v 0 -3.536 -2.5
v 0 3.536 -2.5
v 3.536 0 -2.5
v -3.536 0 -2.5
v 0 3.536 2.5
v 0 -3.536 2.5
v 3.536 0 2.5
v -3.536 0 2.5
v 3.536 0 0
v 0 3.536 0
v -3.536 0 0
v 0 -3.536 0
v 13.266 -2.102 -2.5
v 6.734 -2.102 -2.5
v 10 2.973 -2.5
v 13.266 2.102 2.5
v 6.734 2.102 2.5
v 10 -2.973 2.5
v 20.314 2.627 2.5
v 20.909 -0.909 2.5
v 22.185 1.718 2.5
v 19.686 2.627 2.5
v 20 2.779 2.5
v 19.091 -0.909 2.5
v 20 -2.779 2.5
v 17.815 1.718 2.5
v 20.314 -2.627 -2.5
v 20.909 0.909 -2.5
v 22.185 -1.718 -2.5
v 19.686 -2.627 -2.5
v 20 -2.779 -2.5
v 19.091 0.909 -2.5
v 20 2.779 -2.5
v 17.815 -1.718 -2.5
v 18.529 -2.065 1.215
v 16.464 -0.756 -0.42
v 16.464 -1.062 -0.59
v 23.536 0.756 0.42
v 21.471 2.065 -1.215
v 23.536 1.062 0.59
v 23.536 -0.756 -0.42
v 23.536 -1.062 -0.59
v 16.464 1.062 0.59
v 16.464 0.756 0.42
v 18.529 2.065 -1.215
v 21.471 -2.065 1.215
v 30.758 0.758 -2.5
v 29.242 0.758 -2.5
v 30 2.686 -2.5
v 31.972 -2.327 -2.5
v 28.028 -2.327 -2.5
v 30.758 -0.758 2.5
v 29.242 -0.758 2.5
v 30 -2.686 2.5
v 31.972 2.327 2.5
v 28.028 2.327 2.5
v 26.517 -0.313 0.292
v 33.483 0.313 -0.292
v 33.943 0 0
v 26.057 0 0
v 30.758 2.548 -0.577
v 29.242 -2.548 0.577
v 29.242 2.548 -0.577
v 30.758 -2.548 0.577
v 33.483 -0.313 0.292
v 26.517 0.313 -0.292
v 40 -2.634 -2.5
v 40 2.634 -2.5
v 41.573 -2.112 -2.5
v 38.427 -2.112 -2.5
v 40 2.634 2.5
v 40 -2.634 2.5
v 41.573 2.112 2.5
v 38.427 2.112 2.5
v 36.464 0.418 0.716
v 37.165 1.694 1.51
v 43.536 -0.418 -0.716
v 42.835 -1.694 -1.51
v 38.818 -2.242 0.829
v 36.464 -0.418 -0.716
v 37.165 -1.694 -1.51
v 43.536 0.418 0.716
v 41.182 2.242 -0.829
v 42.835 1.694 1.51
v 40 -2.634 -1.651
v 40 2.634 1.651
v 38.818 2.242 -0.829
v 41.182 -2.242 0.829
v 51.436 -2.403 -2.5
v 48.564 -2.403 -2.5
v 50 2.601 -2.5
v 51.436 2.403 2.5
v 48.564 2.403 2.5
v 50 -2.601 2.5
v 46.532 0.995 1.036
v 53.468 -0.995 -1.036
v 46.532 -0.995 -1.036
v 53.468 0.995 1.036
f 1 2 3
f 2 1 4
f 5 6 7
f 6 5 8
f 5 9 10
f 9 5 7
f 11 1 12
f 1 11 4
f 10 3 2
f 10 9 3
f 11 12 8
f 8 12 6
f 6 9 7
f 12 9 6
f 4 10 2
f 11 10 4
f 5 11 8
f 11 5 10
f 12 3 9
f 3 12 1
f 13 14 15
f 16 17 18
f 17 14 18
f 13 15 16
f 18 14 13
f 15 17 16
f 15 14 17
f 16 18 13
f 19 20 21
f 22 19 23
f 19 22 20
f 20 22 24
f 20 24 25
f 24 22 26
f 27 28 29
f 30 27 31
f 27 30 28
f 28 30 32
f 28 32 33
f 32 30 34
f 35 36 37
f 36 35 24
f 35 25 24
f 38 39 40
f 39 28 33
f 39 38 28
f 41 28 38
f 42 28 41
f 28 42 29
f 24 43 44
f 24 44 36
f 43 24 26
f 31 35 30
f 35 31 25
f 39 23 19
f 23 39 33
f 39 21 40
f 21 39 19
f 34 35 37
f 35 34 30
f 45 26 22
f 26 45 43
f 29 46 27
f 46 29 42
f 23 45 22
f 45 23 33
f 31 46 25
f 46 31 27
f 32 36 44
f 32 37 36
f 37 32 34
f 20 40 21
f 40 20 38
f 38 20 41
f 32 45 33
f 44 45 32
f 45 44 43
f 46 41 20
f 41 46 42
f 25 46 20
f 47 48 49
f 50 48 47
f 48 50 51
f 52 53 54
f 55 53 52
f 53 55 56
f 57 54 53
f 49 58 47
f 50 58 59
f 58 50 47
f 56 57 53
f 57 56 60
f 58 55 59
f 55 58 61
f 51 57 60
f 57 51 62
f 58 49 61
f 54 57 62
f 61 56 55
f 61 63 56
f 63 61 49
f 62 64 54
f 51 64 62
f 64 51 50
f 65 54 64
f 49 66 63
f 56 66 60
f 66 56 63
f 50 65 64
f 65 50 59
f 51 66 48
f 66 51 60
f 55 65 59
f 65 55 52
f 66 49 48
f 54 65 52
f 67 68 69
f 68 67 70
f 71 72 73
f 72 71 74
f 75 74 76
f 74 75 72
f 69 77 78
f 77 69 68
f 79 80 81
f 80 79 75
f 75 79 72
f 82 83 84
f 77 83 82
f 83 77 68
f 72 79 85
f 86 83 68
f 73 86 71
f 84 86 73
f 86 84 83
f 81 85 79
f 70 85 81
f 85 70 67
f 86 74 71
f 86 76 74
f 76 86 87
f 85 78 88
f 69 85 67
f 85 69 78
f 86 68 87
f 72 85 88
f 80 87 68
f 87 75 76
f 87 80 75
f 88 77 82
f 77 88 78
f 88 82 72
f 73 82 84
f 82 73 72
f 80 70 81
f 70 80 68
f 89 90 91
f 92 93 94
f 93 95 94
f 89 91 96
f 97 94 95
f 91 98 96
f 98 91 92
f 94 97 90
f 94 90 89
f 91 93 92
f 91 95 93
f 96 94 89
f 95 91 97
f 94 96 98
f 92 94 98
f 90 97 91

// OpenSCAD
// 2 * 5 = 10面体骰子
module item(w=10,d=45,p=0){
    rotate([d,0,p])
        cube([w*2,w,w*2],center=true);
}

module dice_2n(n=5,w=10){
    p=360/n;
    d=90-atan(sqrt(1/cos(p/2)));
    rotate([90-d,0,0])
    intersection_for (a = [ 0 : (n-1) ])
        item(w,d,p*a);
}

w=5;
n=3;
for(a=[n:8]){
    translate([(a-n)*2*w,0,0])
        dice_2n(a,w);
}
//item(50,0,0);
